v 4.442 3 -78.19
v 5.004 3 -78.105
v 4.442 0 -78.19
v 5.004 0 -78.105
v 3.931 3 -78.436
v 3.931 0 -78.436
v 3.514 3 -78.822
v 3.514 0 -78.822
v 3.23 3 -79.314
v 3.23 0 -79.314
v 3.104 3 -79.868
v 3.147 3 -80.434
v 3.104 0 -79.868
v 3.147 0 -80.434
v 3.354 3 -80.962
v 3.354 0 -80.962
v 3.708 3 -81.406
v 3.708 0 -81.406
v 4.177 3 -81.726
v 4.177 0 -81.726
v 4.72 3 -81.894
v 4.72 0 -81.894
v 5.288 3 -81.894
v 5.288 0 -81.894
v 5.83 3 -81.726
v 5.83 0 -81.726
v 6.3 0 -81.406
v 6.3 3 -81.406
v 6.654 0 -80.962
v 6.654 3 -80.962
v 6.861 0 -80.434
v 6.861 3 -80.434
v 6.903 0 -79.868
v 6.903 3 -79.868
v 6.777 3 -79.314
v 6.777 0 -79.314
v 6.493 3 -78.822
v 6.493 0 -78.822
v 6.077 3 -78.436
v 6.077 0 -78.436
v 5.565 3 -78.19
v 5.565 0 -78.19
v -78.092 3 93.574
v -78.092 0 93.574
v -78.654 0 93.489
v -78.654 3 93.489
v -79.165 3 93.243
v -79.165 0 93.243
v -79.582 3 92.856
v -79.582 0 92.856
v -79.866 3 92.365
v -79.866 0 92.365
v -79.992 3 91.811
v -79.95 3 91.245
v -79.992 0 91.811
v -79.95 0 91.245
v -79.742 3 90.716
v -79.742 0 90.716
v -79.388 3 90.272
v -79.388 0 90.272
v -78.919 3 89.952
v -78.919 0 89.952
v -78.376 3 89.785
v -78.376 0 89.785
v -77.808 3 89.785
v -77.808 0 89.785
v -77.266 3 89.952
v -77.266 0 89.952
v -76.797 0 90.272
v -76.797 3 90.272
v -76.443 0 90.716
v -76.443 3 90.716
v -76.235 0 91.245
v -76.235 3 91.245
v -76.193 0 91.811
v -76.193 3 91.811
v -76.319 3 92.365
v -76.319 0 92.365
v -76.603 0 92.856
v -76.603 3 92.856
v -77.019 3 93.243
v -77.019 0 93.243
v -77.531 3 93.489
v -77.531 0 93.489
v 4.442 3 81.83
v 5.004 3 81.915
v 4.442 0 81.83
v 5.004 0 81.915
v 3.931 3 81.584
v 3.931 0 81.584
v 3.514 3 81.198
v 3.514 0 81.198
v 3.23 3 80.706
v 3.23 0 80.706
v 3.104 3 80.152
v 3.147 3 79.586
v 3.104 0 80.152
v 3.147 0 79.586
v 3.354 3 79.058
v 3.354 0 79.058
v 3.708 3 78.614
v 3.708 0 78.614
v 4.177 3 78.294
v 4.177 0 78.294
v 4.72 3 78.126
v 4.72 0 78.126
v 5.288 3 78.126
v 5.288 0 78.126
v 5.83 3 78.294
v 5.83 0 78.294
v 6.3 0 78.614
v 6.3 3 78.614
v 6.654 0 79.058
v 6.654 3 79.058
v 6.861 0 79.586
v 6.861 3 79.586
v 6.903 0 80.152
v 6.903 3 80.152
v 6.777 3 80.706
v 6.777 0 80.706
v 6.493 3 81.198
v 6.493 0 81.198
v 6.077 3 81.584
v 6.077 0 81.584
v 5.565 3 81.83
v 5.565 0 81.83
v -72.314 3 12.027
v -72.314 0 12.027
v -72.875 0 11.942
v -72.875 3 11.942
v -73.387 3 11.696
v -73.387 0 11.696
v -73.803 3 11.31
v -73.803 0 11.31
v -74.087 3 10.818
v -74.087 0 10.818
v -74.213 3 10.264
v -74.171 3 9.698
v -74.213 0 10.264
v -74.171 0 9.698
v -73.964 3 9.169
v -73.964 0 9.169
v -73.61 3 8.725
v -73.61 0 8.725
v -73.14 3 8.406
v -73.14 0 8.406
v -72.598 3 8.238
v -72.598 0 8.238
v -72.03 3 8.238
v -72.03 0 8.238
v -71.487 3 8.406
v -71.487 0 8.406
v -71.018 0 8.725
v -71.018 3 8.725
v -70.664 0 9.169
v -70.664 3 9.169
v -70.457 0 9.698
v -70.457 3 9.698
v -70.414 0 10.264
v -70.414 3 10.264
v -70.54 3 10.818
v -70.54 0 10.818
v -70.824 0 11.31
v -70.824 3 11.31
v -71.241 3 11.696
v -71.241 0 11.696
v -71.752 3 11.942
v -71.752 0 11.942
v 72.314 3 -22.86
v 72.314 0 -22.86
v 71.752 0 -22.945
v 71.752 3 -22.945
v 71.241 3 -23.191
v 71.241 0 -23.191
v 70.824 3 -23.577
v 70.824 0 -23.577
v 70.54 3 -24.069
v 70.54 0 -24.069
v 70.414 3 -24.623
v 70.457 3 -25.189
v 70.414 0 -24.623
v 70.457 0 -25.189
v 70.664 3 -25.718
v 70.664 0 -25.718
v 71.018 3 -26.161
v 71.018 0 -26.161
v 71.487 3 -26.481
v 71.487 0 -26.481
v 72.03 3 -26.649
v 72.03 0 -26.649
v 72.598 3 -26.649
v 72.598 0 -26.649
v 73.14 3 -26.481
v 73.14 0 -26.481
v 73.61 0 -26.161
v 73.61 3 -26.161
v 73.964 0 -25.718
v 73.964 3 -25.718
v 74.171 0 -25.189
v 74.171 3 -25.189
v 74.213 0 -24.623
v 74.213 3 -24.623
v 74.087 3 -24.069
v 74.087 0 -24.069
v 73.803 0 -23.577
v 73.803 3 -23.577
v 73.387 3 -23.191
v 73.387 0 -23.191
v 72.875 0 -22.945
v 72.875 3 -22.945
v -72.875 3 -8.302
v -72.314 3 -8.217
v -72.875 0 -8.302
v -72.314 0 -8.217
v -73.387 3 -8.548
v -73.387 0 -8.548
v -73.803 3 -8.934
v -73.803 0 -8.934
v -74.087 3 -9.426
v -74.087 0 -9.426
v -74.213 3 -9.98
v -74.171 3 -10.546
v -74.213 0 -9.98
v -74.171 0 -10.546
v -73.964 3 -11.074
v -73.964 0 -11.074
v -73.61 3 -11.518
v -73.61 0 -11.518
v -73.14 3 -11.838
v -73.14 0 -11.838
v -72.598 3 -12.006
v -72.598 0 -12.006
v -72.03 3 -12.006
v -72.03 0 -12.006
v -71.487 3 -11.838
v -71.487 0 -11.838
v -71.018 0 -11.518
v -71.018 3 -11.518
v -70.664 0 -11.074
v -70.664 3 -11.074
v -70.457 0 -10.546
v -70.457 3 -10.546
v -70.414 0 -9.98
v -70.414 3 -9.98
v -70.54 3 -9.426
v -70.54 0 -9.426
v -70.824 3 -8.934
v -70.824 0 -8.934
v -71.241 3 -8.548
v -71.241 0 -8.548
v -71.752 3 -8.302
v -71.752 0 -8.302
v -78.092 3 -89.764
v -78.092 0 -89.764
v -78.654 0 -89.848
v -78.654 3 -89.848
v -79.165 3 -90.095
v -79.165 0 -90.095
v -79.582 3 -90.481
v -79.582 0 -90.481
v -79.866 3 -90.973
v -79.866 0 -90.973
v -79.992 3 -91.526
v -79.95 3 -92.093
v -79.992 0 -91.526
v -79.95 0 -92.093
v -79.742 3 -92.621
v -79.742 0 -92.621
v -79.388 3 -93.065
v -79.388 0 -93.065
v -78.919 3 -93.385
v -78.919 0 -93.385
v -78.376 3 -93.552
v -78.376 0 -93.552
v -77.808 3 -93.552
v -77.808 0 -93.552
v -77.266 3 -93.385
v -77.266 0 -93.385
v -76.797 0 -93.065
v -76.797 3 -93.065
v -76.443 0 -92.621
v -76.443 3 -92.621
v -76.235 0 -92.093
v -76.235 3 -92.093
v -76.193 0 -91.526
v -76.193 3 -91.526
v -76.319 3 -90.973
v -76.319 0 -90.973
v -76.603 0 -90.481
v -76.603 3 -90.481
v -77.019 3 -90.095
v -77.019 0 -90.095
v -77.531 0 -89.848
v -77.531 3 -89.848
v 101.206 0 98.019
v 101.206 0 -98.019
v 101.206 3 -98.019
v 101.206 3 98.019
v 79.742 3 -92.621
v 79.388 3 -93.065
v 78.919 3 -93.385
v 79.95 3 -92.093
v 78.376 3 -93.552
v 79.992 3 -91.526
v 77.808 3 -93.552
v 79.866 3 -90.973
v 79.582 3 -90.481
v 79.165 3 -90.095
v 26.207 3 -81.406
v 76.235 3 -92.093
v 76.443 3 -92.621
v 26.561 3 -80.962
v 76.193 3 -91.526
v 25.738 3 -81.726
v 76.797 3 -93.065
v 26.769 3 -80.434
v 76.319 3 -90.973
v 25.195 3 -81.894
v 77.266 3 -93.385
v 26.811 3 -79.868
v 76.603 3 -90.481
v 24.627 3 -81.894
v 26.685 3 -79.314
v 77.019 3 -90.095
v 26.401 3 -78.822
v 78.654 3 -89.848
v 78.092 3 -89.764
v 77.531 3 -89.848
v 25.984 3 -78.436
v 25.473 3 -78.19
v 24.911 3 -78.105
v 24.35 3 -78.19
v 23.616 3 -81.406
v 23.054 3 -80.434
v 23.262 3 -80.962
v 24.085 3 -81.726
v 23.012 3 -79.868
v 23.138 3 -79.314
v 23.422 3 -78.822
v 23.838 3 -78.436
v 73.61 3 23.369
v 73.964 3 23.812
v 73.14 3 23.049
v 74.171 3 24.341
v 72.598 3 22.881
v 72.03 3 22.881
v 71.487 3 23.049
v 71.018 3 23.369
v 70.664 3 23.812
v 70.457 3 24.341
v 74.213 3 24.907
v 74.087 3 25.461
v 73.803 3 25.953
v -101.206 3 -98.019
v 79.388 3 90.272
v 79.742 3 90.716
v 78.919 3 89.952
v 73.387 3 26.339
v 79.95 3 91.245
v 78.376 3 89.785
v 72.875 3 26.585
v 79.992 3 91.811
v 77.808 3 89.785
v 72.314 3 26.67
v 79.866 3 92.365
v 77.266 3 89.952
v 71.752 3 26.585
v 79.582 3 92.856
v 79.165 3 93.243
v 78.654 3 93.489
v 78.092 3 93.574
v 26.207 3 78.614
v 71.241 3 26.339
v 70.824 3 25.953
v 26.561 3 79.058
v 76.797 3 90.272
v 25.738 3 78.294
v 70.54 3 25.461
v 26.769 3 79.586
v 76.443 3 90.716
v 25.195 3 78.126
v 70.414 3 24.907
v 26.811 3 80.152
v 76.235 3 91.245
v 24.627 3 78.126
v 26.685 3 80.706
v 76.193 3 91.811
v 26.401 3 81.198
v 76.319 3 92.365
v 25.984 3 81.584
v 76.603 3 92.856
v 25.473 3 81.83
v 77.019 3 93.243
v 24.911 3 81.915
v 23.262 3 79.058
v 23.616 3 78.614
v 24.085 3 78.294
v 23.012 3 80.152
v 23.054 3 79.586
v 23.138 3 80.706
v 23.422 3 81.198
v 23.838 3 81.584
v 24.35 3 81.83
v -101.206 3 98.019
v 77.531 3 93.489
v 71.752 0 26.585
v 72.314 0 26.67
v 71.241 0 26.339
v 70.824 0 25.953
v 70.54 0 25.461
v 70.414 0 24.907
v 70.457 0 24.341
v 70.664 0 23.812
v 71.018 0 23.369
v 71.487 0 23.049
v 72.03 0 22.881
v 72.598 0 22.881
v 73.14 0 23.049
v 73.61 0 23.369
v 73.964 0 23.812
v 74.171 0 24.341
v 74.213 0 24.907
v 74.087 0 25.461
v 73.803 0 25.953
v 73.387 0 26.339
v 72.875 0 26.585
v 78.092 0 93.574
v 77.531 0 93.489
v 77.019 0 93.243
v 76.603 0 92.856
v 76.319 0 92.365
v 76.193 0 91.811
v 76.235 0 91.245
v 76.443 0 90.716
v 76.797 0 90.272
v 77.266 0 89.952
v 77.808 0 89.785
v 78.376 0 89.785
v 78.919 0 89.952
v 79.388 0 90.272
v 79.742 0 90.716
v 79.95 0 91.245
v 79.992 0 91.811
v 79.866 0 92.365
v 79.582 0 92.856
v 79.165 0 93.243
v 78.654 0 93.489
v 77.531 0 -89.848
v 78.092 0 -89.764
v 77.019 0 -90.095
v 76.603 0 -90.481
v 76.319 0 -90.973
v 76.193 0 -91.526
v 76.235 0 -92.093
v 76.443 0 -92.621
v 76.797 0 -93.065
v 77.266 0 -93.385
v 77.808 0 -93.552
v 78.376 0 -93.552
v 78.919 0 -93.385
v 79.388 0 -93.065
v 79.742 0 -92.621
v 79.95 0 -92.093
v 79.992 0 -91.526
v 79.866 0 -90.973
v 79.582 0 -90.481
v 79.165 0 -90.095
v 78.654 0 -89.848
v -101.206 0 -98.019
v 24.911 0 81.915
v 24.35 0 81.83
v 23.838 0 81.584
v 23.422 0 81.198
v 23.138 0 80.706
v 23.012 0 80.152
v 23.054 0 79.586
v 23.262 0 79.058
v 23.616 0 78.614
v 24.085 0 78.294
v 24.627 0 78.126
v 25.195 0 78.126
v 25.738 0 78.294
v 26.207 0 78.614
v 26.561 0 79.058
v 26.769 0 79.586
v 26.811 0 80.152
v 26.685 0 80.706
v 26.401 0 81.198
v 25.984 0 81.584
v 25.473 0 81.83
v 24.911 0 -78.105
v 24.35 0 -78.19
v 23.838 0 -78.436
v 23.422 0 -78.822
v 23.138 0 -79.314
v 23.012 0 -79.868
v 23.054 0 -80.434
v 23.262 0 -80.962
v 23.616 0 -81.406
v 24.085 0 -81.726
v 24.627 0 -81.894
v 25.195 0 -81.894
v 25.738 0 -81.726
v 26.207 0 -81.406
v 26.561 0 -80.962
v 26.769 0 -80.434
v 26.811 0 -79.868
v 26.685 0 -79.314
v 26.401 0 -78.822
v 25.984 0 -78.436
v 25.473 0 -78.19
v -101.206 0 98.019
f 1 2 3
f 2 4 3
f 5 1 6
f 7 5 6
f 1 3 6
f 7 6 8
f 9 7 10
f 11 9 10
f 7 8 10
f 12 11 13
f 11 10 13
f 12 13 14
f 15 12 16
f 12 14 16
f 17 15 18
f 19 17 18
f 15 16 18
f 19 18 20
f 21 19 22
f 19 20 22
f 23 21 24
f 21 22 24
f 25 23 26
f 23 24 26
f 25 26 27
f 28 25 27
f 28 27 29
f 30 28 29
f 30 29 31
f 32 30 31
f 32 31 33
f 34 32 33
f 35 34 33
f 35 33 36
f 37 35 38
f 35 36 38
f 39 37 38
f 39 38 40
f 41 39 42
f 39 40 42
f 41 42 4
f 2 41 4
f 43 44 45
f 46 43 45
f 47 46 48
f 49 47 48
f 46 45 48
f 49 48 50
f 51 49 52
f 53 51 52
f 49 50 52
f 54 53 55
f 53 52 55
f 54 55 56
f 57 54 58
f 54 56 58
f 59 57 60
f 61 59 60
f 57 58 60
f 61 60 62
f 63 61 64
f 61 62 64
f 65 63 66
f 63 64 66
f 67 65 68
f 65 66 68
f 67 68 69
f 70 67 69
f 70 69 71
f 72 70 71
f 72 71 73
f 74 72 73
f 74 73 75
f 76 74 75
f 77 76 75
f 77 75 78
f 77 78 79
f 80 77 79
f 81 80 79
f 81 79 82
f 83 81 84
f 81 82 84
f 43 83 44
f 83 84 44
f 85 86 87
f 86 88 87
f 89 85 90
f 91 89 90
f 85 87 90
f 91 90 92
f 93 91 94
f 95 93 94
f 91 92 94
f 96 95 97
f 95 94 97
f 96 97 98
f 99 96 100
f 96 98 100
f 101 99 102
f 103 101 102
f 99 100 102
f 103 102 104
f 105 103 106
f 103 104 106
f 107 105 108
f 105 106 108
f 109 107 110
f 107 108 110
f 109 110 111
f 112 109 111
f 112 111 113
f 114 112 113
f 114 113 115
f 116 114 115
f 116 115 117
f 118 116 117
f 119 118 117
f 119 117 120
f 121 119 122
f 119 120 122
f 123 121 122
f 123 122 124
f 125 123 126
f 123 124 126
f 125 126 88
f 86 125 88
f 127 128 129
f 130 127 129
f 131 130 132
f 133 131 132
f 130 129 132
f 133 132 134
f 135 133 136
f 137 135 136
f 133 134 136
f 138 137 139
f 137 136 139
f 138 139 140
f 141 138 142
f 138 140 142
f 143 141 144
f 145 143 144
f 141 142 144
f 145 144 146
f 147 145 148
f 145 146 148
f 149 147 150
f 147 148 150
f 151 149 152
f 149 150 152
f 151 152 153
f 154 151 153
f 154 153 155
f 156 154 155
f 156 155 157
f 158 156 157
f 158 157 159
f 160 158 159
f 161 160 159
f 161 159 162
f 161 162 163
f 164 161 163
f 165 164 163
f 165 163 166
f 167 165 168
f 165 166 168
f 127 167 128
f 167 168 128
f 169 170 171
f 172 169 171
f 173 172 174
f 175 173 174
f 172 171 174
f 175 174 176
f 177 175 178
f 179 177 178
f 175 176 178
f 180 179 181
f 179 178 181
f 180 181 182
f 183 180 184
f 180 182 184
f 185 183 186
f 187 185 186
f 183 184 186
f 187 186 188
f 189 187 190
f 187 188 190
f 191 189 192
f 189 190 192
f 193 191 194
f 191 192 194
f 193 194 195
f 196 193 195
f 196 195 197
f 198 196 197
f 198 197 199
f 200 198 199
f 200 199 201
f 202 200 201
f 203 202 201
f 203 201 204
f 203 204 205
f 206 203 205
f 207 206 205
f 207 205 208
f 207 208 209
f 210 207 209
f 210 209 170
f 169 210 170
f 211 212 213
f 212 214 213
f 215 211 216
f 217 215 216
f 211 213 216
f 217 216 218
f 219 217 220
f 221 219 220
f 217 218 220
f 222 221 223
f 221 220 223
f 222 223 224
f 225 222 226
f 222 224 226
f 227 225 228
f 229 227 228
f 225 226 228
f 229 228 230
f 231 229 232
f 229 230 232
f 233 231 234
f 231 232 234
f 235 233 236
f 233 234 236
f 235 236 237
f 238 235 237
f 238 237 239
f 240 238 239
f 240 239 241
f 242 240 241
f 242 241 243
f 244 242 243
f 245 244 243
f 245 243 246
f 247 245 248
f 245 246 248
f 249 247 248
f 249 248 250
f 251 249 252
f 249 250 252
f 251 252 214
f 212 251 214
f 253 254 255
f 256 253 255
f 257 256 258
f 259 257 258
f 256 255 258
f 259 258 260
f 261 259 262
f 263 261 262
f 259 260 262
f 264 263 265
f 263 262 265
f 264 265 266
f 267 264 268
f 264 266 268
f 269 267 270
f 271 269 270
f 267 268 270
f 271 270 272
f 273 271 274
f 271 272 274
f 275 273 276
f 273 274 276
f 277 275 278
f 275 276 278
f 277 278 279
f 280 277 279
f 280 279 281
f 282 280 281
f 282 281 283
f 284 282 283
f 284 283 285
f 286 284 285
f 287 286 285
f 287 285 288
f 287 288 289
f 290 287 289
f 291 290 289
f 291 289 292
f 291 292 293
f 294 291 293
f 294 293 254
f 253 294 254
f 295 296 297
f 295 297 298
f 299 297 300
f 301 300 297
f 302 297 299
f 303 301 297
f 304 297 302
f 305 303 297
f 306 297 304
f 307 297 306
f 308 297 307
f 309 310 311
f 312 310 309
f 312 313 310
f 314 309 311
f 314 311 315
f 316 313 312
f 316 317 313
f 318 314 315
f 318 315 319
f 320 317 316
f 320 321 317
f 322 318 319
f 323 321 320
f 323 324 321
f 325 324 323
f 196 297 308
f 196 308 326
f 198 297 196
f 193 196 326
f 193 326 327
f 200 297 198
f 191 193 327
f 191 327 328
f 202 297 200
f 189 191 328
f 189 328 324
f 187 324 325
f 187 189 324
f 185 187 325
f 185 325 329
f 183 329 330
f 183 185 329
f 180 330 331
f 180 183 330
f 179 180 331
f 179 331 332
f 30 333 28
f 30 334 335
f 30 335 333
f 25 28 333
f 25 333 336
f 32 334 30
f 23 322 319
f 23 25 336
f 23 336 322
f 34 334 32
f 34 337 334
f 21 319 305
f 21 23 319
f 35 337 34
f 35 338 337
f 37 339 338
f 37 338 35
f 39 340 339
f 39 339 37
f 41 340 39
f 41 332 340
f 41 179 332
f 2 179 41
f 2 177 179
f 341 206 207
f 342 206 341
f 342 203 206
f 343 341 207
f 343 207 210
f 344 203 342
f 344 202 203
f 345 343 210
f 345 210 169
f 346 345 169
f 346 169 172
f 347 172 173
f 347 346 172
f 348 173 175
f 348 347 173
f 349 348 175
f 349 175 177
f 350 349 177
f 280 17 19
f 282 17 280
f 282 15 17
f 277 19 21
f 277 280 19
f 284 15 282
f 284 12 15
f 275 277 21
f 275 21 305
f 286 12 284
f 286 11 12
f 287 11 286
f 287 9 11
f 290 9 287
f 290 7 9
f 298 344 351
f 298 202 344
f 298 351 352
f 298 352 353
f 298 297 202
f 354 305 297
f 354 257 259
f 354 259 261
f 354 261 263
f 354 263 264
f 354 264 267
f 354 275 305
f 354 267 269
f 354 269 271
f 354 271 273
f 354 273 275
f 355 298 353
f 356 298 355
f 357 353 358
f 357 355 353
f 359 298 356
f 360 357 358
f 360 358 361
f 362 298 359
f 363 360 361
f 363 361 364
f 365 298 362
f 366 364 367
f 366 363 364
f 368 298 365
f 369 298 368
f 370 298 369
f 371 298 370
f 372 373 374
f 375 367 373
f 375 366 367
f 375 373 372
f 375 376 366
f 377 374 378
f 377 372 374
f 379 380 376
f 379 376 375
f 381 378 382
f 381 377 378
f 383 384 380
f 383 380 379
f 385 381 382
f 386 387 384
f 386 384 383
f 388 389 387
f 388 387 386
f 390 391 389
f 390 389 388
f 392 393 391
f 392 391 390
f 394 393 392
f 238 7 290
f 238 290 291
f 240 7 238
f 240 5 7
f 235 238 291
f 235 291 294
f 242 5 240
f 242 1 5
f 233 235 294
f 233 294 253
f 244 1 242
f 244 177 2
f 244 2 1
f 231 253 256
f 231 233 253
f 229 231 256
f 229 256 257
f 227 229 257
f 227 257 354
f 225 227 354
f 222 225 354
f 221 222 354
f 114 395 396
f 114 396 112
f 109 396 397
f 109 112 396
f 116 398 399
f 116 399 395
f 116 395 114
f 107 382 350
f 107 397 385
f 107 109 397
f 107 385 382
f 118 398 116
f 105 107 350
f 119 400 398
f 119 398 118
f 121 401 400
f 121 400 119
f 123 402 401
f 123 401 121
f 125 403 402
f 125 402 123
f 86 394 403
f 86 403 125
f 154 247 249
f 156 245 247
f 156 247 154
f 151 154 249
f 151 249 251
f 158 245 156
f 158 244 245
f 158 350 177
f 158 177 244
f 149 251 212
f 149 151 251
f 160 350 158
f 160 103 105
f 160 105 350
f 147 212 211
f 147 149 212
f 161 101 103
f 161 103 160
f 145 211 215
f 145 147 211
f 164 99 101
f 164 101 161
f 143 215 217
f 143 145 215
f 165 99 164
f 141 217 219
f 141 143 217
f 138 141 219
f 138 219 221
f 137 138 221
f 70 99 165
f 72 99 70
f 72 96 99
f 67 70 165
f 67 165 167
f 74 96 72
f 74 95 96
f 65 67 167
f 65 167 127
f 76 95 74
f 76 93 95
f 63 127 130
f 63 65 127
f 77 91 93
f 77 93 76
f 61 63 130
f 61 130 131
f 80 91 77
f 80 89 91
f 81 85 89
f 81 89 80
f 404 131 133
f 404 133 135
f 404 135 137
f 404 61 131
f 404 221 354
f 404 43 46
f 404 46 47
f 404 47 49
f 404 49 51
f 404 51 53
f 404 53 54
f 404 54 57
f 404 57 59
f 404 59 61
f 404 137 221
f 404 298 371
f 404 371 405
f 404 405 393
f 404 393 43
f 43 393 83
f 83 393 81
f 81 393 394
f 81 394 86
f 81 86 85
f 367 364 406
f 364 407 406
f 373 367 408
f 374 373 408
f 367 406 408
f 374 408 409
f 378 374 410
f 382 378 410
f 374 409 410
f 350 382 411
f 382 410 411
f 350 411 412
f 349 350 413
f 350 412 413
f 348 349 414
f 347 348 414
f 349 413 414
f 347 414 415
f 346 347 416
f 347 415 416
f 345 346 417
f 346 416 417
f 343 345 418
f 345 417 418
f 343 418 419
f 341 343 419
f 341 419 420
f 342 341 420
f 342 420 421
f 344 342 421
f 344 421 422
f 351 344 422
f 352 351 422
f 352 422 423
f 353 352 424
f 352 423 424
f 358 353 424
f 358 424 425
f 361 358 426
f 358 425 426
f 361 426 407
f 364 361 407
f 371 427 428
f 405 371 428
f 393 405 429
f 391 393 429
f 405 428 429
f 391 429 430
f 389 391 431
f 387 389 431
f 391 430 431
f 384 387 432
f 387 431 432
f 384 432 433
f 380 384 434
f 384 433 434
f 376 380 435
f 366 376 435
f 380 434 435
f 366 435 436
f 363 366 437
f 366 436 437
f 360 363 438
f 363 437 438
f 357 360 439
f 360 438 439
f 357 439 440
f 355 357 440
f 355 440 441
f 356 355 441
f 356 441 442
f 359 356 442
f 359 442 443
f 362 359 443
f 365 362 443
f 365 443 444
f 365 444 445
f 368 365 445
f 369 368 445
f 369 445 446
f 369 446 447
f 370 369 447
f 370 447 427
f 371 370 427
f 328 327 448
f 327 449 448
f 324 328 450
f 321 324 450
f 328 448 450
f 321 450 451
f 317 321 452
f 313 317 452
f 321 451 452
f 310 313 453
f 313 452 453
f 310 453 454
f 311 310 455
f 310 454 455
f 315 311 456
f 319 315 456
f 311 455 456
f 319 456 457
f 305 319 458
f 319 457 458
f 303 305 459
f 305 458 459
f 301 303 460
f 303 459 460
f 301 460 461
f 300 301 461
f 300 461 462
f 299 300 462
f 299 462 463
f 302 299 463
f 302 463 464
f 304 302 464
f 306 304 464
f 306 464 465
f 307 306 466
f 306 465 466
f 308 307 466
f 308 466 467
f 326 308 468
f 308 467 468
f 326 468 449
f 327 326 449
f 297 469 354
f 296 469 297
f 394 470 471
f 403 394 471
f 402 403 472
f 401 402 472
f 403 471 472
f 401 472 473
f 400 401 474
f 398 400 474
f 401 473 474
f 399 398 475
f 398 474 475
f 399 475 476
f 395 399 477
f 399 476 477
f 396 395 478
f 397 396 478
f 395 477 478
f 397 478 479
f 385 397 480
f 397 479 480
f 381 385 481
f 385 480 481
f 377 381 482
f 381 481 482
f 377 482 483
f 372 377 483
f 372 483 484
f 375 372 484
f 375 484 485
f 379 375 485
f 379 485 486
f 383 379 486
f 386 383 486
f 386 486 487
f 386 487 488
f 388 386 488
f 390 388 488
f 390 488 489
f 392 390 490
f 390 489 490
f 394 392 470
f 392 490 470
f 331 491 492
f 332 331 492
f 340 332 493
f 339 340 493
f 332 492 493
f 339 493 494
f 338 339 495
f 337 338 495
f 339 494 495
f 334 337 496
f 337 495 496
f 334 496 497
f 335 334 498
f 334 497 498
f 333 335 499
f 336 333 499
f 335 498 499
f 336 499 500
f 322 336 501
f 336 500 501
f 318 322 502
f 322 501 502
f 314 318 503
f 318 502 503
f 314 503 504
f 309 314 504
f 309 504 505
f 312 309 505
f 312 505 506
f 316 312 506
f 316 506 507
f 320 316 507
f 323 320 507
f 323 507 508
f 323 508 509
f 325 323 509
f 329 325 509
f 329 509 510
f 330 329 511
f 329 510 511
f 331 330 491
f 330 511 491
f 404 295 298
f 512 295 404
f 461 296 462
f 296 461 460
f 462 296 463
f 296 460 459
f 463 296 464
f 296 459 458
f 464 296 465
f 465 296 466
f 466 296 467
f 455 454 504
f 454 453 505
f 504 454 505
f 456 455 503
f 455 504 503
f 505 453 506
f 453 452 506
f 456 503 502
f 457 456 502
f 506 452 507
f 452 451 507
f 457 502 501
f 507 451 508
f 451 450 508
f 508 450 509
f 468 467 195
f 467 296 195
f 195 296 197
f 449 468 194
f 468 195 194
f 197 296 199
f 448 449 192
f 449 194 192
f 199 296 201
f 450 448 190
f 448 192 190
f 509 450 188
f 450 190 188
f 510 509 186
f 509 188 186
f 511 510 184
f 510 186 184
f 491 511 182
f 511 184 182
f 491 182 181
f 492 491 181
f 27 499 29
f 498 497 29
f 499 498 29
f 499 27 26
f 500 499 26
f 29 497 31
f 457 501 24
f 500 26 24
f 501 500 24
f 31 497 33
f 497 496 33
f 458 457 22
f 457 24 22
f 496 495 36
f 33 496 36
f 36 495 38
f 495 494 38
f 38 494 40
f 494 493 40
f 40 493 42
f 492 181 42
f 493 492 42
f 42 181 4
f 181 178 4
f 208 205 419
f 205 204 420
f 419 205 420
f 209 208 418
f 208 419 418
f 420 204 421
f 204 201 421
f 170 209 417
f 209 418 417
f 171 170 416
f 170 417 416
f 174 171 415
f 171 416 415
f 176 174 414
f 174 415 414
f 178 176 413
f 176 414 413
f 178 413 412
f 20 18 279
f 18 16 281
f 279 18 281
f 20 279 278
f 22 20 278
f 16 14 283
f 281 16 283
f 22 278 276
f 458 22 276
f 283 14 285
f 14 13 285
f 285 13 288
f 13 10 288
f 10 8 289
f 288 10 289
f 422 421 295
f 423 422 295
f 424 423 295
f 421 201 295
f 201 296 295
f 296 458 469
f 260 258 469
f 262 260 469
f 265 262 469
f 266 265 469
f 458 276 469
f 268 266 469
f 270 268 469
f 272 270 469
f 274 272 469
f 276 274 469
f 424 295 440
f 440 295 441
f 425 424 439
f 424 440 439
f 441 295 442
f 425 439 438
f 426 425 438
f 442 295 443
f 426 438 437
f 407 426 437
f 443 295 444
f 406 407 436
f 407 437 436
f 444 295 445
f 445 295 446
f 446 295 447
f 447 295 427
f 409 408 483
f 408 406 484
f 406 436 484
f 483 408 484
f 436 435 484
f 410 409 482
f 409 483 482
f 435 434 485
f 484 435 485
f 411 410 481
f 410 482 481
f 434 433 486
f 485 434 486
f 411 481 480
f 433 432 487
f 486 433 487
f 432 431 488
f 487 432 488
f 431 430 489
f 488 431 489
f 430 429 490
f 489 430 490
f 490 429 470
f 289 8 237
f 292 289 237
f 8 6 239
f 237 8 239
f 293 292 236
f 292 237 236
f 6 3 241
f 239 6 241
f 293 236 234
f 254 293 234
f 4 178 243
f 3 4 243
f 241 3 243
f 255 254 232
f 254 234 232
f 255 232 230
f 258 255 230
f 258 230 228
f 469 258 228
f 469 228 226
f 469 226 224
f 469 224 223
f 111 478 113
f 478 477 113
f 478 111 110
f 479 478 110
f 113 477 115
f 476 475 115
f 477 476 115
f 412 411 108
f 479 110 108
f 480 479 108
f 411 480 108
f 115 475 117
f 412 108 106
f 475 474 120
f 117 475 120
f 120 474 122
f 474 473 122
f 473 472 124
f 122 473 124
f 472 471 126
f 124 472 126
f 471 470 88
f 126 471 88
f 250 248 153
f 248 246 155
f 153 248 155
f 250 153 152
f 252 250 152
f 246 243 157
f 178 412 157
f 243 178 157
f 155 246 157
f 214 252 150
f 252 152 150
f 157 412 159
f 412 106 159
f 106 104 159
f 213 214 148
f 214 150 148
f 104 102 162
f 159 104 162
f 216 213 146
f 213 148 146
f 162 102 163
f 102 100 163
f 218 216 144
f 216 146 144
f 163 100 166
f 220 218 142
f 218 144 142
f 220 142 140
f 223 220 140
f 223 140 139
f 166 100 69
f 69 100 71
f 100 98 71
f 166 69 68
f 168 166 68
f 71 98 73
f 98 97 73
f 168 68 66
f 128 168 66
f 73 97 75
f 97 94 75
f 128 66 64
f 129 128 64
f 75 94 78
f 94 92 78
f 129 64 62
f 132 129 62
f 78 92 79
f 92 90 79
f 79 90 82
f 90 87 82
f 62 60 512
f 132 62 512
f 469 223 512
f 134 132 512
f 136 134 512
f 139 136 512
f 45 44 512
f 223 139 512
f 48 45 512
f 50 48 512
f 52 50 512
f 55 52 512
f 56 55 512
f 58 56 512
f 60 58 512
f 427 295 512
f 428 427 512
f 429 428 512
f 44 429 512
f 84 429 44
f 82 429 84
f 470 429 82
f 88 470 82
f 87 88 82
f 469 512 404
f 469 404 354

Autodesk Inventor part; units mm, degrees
ref_plane "YZ Plane" through (0, 0, 0) normal (1, 0, 0) x (0, 1, 0)
ref_plane "XZ Plane" through (0, 0, 0) normal (0, 1, 0) x (-1, 0, 0)
ref_plane "XY Plane" through (0, 0, 0) normal (0, 0, 1) x (1, 0, 0)
sketch "Block1" plane through (0, 0, 0) normal (0, 0, 1) x (1, 0, 0)
  circle A0 centre (244.9891, 313.0766) radius 1.651
  circle A1 centre (305.4278, 286.7035) radius 1.651
  circle A2 centre (242.5353, 295.4667) radius 1.651
  circle A3 centre (307.8815, 304.3134) radius 1.651
  circle A4 centre (325.7478, 277.8135) radius 1.651
  circle A5 centre (227.9578, 277.8135) radius 1.651
  circle A6 centre (194.5568, 203.1375) radius 1.651
  circle A7 centre (325.7478, 166.5615) radius 1.651
  circle A8 centre (227.9578, 166.5615) radius 1.651
  circle A9 centre (247.0078, 166.5615) radius 1.651
  circle A10 centre (344.7978, 166.5615) radius 1.651
  circle A11 centre (194.5568, 241.2375) radius 1.651
  circle A12 centre (247.0078, 277.8135) radius 1.651
  circle A13 centre (344.7978, 277.8135) radius 1.651
  circle A14 centre (181.8568, 156.6555) radius 1.905
  circle A15 centre (181.8568, 312.8401) radius 1.905
  circle A16 centre (365.194, 312.8401) radius 1.905
  circle A17 centre (365.194, 156.6555) radius 1.905
  line L0 (371.544, 133.5415) -> (371.544, 335.9541)
  line L1 (175.5068, 133.5415) -> (371.544, 133.5415)
  line L2 (175.5068, 335.9541) -> (175.5068, 133.5415)
  line L3 (371.544, 335.9541) -> (175.5068, 335.9541)
  point P0 (271.6644, 239.9388)
sketch "Sketch2" plane through (0, 0, 0) normal (0, 1, 0) x (-1, 0, 0)
  line L0 (101.2063, -98.0186) -> (-101.2063, -98.0186)
  line L1 (-101.2063, -98.0186) -> (-101.2063, 98.0186)
  line L2 (-101.2063, 98.0186) -> (101.2063, 98.0186)
  line L3 (101.2063, 98.0186) -> (101.2063, -98.0186)
  point P0 (0, 0)
  point P1 (-101.2063, 0)
  point P2 (0, -98.0186)
  dimension "d2" = 196.0372
  dimension "d3" = 202.4126
extrude "Extrusion2" add sketch "Sketch2" along normal blind 3
sketch "Sketch3" plane through (0, 3, 0) normal (0, 1, 0) x (1, 0, 0)
  line L0 (101.2063, 98.0186) -> (-101.2063, 98.0186) projected
  line L1 (-101.2063, 98.0186) -> (-101.2063, -98.0186) projected
  line L2 (101.2063, -98.0186) -> (101.2063, 98.0186) projected
  line L3 (-101.2063, -98.0186) -> (101.2063, -98.0186) projected
  line L4 (101.2063, 0) -> (-101.2063, 0) construction
  line L5 (72.3138, 24.765) -> (101.2063, 24.765) construction
  line L6 (-72.3138, 10.1219) -> (-101.2063, 10.1219) construction
  point P0 (0, 0)
  point P1 (-78.0923, 91.6686)
  point P2 (78.0923, 91.6686)
  point P3 (-78.0923, -91.6686)
  point P4 (78.0923, -91.6686)
  point P5 (5.0038, 80.01)
  point P6 (24.9113, 80.01)
  point P7 (72.3138, -24.765)
  point P8 (5.0038, -80.01)
  point P9 (24.9113, -80.01)
  point P10 (-72.3138, -10.1219)
  dimension "d6" = 6.35
  dimension "d7" = 23.114
  dimension "d8" = 6.35
  dimension "d9" = 23.114
  dimension "d10" = 6.35
  dimension "d11" = 23.114
  dimension "d12" = 23.114
  dimension "d13" = 6.35
  dimension "d24" = 19.9075
  dimension "d25" = 49.53
  dimension "d26" = 72.7943
  dimension "d27" = 72.7943
  dimension "d28" = 24.765
  dimension "d29" = 160.02
  dimension "d31" = 20.2438
  dimension "d32" = 10.1219
  dimension "d33" = 144.6276
hole "Hole1" at (-78.0923, 3, -91.6686) at (78.0923, 3, -91.6686) at (-78.0923, 3, 91.6686) at (78.0923, 3, 91.6686) at (5.0038, 3, -80.01) at (24.9113, 3, -80.01) at (72.3138, 3, -24.765) at (72.3138, 3, 24.765) at (5.0038, 3, 80.01) at (24.9113, 3, 80.01) at (-72.3138, 3, -10.1219) at (-72.3138, 3, 10.1219) direction (0, -1, 0) diameter 3.81 end through all
equation "\"d8\" = d6"
equation "\"d9\" = d7"
equation "\"d10\" = d6"
equation "\"d11\" = d7"
equation "\"d12\" = d7"
equation "\"d13\" = d6"
equation "\"d27\" = d26"
equation "\"d28\" = 0.5 * d25"
equation "\"d32\" = 0.5 * d31"
properties part number "BottomPlate"
